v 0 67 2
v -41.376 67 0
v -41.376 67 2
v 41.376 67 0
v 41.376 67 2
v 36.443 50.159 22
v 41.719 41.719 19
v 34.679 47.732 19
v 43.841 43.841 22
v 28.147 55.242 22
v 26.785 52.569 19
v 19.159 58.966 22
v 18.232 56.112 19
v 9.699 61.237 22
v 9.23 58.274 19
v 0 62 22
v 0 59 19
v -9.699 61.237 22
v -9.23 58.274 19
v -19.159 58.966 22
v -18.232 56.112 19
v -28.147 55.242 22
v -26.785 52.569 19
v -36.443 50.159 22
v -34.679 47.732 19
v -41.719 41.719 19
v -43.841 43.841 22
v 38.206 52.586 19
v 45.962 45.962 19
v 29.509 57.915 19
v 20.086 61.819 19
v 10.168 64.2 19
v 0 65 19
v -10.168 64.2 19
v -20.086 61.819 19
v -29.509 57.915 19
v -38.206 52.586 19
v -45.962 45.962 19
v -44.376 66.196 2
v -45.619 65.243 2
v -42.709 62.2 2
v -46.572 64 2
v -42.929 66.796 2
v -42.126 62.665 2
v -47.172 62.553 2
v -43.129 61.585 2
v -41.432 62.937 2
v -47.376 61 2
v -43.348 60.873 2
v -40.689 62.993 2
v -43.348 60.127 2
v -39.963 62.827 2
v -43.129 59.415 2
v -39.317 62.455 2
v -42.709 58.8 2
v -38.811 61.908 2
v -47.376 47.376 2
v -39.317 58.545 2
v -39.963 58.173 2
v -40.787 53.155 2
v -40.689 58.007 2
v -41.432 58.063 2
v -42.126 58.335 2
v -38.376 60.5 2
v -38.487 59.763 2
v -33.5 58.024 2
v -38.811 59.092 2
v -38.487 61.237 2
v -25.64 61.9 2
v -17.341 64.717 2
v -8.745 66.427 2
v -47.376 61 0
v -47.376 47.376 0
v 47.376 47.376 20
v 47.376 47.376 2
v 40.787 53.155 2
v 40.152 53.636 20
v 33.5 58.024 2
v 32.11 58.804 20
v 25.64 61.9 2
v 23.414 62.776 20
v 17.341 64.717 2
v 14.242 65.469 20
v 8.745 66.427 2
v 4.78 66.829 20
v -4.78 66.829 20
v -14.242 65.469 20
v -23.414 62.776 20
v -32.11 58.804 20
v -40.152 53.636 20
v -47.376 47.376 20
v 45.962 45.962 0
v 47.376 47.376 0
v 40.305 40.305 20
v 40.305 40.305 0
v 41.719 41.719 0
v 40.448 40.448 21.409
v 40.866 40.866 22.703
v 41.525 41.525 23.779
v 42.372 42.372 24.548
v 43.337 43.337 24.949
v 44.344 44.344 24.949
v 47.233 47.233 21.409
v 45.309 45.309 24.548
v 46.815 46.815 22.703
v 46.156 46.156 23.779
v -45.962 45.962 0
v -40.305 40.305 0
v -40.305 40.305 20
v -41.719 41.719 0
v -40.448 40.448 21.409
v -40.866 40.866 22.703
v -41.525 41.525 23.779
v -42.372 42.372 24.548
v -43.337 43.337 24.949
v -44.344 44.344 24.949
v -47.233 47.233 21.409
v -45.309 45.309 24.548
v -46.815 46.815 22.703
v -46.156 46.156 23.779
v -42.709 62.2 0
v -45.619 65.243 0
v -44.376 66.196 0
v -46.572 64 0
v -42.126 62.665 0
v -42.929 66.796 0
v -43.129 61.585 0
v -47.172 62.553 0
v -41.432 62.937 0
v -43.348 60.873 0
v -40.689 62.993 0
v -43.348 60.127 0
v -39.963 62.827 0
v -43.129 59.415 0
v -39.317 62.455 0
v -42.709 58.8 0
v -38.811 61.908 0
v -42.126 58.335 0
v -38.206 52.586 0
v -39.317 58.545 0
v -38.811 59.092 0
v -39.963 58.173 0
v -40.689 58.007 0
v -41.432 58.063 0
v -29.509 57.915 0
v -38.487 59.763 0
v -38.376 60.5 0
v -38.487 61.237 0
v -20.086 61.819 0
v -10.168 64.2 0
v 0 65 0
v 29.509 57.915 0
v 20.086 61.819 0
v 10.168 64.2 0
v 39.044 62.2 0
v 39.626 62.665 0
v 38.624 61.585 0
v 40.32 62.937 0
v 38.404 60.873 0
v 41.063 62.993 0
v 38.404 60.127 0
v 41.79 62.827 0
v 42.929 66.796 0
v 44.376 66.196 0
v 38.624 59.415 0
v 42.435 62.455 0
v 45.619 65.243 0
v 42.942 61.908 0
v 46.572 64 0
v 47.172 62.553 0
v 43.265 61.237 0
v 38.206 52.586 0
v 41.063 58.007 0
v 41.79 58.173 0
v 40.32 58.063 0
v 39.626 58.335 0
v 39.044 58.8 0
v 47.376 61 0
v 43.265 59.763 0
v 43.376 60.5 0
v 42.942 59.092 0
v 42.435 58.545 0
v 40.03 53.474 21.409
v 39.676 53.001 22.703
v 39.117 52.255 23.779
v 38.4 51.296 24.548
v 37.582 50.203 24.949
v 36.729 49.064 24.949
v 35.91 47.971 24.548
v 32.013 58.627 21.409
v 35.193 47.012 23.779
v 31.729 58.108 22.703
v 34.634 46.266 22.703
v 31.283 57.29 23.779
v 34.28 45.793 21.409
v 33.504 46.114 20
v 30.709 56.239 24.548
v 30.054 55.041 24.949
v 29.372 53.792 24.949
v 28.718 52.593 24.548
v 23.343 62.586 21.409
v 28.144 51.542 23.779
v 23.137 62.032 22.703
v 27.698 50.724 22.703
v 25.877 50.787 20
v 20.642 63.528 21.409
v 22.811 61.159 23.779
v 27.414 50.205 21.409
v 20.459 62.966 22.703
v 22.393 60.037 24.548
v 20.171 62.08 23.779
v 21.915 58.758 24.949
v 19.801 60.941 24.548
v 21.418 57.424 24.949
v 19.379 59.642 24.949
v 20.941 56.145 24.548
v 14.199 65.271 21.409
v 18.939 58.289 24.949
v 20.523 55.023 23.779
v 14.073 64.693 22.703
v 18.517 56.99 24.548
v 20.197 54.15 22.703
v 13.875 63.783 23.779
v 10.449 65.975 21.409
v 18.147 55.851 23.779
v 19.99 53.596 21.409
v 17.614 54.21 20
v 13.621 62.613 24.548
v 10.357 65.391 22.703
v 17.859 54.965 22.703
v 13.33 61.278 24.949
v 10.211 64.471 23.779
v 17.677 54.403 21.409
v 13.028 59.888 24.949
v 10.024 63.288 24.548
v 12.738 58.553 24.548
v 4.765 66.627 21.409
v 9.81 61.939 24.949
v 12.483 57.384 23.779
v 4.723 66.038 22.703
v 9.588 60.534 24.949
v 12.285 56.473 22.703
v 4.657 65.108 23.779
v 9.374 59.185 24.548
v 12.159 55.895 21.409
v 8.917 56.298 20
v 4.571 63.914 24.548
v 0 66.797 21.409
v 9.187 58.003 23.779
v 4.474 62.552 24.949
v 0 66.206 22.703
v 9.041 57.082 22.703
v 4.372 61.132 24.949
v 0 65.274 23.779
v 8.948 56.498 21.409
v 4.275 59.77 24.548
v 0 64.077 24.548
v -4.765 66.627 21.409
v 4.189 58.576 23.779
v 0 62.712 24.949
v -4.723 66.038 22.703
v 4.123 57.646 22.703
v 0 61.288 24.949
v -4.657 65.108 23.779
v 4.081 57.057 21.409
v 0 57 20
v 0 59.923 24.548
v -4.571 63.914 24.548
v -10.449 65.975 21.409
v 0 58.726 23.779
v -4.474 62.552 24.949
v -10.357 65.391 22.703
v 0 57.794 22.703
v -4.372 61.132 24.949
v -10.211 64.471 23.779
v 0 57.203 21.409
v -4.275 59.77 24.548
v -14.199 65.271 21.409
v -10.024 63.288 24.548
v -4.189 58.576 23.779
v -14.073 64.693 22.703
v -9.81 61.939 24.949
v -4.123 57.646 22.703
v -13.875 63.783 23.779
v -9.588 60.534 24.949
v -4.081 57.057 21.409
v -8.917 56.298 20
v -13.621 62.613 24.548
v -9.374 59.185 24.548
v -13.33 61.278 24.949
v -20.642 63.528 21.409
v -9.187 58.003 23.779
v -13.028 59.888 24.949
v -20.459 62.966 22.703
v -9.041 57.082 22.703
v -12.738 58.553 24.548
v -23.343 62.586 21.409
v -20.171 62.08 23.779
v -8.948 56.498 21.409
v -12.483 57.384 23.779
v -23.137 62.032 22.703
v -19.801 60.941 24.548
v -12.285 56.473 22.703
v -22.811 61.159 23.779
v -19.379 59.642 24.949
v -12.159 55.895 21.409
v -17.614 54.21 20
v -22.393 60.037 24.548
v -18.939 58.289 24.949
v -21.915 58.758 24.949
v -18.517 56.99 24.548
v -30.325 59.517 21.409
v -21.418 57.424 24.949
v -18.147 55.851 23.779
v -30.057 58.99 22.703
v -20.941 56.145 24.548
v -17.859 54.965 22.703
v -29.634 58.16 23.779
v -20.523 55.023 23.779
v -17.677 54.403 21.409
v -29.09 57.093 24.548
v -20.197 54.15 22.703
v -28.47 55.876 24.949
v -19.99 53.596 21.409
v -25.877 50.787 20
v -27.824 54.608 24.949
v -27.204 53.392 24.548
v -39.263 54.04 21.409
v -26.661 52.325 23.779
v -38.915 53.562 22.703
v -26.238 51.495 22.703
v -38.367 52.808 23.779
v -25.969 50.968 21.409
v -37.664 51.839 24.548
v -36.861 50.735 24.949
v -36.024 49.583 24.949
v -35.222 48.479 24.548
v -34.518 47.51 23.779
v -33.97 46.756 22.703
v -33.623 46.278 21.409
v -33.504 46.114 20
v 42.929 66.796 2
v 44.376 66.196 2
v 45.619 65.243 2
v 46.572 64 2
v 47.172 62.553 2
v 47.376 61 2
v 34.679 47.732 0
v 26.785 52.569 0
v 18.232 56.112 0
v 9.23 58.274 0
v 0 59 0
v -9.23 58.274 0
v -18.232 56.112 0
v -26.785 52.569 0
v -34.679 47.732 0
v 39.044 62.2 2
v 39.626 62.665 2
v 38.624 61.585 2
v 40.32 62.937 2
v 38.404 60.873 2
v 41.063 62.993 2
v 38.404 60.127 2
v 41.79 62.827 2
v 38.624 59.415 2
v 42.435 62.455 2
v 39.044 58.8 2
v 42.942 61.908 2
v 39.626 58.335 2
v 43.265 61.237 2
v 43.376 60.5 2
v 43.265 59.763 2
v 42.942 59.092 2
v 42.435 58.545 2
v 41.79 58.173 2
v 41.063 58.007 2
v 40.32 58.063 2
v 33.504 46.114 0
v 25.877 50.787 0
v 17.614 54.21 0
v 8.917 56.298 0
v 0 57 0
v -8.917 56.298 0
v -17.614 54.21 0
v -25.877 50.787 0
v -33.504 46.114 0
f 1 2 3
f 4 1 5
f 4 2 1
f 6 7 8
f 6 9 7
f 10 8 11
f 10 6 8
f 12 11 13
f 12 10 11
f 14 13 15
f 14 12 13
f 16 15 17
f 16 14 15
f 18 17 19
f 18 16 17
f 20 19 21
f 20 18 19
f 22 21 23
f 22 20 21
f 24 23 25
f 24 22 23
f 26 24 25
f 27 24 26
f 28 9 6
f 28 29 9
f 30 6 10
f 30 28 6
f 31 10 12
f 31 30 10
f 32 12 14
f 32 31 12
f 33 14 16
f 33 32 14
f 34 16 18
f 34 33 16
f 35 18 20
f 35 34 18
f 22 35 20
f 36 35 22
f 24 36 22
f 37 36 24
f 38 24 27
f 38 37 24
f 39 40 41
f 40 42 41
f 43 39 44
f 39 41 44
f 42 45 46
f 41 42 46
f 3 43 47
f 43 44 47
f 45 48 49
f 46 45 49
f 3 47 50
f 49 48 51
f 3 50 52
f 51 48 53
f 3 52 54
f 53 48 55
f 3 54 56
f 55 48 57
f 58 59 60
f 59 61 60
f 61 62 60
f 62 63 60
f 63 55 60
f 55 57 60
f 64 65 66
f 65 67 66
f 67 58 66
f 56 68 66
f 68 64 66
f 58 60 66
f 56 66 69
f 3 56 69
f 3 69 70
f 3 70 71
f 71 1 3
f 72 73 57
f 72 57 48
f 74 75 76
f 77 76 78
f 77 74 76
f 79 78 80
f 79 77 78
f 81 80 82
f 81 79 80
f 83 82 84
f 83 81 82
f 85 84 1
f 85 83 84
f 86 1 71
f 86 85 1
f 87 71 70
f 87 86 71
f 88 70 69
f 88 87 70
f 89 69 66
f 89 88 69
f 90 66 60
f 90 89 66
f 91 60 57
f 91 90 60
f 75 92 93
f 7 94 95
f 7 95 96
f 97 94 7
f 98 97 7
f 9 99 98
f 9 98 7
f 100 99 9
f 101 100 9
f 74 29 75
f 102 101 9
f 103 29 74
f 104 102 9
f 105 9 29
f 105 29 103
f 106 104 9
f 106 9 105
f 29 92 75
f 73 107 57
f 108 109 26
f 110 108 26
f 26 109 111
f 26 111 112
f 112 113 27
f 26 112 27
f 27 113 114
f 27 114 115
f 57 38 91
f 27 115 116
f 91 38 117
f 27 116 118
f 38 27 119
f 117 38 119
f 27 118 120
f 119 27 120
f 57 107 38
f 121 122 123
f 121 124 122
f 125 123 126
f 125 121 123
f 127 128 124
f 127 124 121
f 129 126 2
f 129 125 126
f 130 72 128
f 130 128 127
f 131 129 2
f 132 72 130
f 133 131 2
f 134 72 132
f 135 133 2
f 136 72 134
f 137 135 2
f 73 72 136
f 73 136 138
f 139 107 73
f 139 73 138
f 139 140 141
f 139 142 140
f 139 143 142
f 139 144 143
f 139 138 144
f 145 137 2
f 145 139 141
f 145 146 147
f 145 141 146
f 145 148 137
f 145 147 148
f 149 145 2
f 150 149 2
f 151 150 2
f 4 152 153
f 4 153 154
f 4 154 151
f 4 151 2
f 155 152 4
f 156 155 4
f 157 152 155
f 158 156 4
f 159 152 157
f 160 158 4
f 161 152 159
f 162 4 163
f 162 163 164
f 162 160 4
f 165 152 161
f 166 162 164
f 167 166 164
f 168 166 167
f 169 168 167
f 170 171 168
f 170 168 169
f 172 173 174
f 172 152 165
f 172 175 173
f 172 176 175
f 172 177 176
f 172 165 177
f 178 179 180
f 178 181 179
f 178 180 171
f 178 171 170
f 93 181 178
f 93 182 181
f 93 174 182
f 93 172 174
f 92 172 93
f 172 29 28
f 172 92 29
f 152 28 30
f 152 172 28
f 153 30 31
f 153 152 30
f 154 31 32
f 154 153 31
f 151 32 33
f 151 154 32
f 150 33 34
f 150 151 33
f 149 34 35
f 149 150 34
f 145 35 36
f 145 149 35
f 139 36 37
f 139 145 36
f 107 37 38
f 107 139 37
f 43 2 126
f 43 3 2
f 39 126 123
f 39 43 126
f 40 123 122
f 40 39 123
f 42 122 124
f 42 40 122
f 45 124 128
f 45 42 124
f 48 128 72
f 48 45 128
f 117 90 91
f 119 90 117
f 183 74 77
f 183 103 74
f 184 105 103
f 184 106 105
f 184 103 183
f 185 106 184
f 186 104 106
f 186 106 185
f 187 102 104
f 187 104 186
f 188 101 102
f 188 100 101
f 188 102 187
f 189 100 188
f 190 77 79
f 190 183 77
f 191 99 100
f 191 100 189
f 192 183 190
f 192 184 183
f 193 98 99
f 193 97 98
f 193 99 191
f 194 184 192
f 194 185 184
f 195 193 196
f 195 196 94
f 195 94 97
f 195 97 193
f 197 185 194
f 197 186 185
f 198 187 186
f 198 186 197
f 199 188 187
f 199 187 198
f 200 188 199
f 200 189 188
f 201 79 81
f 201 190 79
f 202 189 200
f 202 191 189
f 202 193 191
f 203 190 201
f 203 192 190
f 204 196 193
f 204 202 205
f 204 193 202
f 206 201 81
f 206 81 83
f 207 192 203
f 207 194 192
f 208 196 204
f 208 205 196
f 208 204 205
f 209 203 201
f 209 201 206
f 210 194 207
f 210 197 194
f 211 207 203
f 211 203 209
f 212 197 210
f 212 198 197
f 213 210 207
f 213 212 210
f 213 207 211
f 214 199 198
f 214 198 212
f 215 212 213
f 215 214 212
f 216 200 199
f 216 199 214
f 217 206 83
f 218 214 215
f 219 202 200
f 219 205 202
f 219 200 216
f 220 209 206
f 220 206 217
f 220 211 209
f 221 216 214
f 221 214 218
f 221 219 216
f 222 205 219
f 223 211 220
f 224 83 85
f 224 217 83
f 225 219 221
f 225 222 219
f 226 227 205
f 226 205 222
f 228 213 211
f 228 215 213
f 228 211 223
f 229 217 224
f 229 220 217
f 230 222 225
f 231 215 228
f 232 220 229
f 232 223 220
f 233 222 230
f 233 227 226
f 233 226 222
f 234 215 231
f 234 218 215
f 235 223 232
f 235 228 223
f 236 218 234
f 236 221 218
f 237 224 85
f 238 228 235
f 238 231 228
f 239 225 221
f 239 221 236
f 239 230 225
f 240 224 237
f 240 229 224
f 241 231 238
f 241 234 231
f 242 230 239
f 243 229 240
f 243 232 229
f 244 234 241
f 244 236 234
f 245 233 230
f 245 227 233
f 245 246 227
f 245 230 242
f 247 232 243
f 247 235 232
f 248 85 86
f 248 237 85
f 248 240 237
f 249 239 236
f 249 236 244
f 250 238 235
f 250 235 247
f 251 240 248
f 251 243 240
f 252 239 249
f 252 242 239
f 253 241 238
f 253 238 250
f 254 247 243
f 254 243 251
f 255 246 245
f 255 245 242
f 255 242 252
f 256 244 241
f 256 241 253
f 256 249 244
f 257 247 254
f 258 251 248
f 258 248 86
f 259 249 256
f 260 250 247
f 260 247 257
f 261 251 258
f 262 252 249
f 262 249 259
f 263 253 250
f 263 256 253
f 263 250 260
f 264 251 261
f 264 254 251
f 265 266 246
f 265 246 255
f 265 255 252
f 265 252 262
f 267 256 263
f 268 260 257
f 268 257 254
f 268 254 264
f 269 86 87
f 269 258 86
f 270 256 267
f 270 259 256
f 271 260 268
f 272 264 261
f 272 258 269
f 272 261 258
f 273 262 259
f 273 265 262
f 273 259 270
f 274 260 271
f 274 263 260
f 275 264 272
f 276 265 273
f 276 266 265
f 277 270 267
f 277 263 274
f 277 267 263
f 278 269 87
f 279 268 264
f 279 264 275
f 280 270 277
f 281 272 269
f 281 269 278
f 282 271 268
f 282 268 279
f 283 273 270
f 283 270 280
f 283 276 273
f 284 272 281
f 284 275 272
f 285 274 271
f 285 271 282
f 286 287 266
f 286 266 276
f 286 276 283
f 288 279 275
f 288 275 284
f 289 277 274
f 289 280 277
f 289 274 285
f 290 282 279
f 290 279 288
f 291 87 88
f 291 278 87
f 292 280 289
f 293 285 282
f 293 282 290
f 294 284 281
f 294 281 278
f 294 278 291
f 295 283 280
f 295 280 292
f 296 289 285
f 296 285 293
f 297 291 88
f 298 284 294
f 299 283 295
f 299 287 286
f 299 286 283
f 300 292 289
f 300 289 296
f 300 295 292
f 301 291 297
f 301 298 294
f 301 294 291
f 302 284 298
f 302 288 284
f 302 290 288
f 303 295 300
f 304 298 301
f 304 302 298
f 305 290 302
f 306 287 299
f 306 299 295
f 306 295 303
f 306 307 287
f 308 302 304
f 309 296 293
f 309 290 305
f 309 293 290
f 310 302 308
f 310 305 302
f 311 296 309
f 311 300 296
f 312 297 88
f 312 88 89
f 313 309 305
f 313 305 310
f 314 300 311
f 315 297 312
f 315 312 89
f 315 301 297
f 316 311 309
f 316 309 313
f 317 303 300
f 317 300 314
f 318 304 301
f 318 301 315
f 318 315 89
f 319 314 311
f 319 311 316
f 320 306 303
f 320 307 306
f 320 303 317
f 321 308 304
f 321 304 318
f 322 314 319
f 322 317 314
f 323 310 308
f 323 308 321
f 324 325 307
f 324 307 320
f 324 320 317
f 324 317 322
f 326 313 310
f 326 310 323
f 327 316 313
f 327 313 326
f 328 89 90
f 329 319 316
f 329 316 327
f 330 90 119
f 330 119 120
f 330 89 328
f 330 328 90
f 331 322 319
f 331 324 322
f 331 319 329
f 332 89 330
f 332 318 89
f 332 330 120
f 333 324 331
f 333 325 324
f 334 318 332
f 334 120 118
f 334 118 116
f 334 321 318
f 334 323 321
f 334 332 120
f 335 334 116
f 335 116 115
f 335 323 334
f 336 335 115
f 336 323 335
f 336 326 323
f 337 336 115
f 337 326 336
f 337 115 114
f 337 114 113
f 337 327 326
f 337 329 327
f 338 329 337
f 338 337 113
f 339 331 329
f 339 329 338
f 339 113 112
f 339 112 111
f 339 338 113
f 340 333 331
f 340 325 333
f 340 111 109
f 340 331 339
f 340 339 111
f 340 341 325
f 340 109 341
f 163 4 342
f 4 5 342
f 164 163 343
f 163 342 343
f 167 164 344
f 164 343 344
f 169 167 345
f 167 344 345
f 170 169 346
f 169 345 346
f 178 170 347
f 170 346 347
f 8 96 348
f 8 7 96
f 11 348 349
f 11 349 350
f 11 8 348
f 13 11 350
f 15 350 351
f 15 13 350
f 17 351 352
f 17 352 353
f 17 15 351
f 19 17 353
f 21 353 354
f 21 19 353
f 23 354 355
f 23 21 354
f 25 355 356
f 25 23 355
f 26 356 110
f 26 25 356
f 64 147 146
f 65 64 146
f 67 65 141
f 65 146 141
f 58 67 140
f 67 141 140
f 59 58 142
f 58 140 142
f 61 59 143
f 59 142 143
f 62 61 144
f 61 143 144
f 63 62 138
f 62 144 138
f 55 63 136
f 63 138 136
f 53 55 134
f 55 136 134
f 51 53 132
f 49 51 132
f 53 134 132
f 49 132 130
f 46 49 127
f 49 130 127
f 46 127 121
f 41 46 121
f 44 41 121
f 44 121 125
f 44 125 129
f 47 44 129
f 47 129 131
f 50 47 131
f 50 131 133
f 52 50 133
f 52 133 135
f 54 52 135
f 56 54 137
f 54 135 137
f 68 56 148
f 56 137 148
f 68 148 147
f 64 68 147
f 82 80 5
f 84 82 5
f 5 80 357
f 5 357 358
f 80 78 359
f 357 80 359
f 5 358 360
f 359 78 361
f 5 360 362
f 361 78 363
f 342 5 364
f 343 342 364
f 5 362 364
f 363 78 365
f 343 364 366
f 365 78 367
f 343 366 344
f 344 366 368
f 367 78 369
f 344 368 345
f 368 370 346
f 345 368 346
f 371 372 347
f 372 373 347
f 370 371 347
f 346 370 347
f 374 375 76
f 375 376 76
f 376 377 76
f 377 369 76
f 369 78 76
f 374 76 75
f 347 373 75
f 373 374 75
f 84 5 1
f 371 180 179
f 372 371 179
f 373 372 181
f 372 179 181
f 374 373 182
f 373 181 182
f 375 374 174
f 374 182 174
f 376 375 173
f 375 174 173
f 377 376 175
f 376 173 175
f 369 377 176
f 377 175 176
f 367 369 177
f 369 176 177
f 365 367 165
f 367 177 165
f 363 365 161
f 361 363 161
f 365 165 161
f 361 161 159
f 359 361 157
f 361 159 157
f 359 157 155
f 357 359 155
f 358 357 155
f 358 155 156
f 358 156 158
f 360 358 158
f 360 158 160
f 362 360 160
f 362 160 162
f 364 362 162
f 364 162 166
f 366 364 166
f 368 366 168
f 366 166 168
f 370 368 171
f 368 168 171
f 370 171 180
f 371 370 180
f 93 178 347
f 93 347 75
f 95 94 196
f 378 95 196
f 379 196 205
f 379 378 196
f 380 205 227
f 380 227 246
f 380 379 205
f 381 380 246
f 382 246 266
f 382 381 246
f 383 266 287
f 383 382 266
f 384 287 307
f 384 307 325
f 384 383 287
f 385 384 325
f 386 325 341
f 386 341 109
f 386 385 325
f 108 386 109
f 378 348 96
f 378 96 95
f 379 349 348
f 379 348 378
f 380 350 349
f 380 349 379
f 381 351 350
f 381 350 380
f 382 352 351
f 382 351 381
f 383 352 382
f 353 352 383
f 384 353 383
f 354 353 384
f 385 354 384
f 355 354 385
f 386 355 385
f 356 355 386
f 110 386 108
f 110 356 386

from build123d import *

# Parameters (mm, degrees)
F1_ANGLE_BACK = 45
F1_ANGLE      = 90
F2_R          = 2.5
F3_DEPTH      = 2
F4_R          = 6


with BuildPart() as f1:
    # F0 (on Right) → F1 (revolve)
    with BuildSketch(Plane.YZ, mode=Mode.PRIVATE) as f1_sk:
        with BuildLine():
            Line((65, 19), (65, 0))
            Line((65, 0), (67, 0))
            Line((67, 0), (67, 20))
            ThreePointArc((67, 20), (62, 25), (57, 20))
            Line((57, 20), (57, 0))
            Line((57, 0), (59, 0))
            Line((59, 0), (59, 19))
            Line((59, 19), (62, 22))
            Line((62, 22), (65, 19))
        make_face()
    revolve(f1_sk.sketch.rotate(Axis((0, 0, 11), (0, 0, 1)), -F1_ANGLE_BACK), axis=Axis((0, 0, 11), (0, 0, 1)), revolution_arc=F1_ANGLE)

    # F2 (on face) → F3 (join)
    with BuildSketch(Plane(origin=(0, 0, 0), x_dir=(1, 0, 0), z_dir=(0, 0, -1))):
        with BuildLine():
            ThreePointArc((0, -67), (-25.6397899685, -61.8999286783), (-47.3761543395, -47.3761543395))
            Line((-47.3761543395, -47.3761543395), (-47.3761543395, -67))
            Line((-47.3761543395, -67), (0, -67))
        make_face()
        with Locations((-40.8761543395, -60.5)):
            Circle(F2_R, mode=Mode.SUBTRACT)
        with BuildLine():
            ThreePointArc((47.3761543395, -47.3761543395), (25.6397899685, -61.8999286783), (0, -67))
            Line((0, -67), (47.3761543395, -67))
            Line((47.3761543395, -67), (47.3761543395, -47.3761543395))
        make_face()
        with Locations((40.8761543395, -60.5)):
            Circle(F2_R, mode=Mode.SUBTRACT)
    extrude(amount=-F3_DEPTH)

    # F4
    f4_edges = [f1.edges().sort_by_distance(p)[0] for p in [
        (-47.376154, 67, 1),
        (47.376154, 67, 1),
    ]]
    fillet(f4_edges, radius=F4_R)


solid = f1.part
